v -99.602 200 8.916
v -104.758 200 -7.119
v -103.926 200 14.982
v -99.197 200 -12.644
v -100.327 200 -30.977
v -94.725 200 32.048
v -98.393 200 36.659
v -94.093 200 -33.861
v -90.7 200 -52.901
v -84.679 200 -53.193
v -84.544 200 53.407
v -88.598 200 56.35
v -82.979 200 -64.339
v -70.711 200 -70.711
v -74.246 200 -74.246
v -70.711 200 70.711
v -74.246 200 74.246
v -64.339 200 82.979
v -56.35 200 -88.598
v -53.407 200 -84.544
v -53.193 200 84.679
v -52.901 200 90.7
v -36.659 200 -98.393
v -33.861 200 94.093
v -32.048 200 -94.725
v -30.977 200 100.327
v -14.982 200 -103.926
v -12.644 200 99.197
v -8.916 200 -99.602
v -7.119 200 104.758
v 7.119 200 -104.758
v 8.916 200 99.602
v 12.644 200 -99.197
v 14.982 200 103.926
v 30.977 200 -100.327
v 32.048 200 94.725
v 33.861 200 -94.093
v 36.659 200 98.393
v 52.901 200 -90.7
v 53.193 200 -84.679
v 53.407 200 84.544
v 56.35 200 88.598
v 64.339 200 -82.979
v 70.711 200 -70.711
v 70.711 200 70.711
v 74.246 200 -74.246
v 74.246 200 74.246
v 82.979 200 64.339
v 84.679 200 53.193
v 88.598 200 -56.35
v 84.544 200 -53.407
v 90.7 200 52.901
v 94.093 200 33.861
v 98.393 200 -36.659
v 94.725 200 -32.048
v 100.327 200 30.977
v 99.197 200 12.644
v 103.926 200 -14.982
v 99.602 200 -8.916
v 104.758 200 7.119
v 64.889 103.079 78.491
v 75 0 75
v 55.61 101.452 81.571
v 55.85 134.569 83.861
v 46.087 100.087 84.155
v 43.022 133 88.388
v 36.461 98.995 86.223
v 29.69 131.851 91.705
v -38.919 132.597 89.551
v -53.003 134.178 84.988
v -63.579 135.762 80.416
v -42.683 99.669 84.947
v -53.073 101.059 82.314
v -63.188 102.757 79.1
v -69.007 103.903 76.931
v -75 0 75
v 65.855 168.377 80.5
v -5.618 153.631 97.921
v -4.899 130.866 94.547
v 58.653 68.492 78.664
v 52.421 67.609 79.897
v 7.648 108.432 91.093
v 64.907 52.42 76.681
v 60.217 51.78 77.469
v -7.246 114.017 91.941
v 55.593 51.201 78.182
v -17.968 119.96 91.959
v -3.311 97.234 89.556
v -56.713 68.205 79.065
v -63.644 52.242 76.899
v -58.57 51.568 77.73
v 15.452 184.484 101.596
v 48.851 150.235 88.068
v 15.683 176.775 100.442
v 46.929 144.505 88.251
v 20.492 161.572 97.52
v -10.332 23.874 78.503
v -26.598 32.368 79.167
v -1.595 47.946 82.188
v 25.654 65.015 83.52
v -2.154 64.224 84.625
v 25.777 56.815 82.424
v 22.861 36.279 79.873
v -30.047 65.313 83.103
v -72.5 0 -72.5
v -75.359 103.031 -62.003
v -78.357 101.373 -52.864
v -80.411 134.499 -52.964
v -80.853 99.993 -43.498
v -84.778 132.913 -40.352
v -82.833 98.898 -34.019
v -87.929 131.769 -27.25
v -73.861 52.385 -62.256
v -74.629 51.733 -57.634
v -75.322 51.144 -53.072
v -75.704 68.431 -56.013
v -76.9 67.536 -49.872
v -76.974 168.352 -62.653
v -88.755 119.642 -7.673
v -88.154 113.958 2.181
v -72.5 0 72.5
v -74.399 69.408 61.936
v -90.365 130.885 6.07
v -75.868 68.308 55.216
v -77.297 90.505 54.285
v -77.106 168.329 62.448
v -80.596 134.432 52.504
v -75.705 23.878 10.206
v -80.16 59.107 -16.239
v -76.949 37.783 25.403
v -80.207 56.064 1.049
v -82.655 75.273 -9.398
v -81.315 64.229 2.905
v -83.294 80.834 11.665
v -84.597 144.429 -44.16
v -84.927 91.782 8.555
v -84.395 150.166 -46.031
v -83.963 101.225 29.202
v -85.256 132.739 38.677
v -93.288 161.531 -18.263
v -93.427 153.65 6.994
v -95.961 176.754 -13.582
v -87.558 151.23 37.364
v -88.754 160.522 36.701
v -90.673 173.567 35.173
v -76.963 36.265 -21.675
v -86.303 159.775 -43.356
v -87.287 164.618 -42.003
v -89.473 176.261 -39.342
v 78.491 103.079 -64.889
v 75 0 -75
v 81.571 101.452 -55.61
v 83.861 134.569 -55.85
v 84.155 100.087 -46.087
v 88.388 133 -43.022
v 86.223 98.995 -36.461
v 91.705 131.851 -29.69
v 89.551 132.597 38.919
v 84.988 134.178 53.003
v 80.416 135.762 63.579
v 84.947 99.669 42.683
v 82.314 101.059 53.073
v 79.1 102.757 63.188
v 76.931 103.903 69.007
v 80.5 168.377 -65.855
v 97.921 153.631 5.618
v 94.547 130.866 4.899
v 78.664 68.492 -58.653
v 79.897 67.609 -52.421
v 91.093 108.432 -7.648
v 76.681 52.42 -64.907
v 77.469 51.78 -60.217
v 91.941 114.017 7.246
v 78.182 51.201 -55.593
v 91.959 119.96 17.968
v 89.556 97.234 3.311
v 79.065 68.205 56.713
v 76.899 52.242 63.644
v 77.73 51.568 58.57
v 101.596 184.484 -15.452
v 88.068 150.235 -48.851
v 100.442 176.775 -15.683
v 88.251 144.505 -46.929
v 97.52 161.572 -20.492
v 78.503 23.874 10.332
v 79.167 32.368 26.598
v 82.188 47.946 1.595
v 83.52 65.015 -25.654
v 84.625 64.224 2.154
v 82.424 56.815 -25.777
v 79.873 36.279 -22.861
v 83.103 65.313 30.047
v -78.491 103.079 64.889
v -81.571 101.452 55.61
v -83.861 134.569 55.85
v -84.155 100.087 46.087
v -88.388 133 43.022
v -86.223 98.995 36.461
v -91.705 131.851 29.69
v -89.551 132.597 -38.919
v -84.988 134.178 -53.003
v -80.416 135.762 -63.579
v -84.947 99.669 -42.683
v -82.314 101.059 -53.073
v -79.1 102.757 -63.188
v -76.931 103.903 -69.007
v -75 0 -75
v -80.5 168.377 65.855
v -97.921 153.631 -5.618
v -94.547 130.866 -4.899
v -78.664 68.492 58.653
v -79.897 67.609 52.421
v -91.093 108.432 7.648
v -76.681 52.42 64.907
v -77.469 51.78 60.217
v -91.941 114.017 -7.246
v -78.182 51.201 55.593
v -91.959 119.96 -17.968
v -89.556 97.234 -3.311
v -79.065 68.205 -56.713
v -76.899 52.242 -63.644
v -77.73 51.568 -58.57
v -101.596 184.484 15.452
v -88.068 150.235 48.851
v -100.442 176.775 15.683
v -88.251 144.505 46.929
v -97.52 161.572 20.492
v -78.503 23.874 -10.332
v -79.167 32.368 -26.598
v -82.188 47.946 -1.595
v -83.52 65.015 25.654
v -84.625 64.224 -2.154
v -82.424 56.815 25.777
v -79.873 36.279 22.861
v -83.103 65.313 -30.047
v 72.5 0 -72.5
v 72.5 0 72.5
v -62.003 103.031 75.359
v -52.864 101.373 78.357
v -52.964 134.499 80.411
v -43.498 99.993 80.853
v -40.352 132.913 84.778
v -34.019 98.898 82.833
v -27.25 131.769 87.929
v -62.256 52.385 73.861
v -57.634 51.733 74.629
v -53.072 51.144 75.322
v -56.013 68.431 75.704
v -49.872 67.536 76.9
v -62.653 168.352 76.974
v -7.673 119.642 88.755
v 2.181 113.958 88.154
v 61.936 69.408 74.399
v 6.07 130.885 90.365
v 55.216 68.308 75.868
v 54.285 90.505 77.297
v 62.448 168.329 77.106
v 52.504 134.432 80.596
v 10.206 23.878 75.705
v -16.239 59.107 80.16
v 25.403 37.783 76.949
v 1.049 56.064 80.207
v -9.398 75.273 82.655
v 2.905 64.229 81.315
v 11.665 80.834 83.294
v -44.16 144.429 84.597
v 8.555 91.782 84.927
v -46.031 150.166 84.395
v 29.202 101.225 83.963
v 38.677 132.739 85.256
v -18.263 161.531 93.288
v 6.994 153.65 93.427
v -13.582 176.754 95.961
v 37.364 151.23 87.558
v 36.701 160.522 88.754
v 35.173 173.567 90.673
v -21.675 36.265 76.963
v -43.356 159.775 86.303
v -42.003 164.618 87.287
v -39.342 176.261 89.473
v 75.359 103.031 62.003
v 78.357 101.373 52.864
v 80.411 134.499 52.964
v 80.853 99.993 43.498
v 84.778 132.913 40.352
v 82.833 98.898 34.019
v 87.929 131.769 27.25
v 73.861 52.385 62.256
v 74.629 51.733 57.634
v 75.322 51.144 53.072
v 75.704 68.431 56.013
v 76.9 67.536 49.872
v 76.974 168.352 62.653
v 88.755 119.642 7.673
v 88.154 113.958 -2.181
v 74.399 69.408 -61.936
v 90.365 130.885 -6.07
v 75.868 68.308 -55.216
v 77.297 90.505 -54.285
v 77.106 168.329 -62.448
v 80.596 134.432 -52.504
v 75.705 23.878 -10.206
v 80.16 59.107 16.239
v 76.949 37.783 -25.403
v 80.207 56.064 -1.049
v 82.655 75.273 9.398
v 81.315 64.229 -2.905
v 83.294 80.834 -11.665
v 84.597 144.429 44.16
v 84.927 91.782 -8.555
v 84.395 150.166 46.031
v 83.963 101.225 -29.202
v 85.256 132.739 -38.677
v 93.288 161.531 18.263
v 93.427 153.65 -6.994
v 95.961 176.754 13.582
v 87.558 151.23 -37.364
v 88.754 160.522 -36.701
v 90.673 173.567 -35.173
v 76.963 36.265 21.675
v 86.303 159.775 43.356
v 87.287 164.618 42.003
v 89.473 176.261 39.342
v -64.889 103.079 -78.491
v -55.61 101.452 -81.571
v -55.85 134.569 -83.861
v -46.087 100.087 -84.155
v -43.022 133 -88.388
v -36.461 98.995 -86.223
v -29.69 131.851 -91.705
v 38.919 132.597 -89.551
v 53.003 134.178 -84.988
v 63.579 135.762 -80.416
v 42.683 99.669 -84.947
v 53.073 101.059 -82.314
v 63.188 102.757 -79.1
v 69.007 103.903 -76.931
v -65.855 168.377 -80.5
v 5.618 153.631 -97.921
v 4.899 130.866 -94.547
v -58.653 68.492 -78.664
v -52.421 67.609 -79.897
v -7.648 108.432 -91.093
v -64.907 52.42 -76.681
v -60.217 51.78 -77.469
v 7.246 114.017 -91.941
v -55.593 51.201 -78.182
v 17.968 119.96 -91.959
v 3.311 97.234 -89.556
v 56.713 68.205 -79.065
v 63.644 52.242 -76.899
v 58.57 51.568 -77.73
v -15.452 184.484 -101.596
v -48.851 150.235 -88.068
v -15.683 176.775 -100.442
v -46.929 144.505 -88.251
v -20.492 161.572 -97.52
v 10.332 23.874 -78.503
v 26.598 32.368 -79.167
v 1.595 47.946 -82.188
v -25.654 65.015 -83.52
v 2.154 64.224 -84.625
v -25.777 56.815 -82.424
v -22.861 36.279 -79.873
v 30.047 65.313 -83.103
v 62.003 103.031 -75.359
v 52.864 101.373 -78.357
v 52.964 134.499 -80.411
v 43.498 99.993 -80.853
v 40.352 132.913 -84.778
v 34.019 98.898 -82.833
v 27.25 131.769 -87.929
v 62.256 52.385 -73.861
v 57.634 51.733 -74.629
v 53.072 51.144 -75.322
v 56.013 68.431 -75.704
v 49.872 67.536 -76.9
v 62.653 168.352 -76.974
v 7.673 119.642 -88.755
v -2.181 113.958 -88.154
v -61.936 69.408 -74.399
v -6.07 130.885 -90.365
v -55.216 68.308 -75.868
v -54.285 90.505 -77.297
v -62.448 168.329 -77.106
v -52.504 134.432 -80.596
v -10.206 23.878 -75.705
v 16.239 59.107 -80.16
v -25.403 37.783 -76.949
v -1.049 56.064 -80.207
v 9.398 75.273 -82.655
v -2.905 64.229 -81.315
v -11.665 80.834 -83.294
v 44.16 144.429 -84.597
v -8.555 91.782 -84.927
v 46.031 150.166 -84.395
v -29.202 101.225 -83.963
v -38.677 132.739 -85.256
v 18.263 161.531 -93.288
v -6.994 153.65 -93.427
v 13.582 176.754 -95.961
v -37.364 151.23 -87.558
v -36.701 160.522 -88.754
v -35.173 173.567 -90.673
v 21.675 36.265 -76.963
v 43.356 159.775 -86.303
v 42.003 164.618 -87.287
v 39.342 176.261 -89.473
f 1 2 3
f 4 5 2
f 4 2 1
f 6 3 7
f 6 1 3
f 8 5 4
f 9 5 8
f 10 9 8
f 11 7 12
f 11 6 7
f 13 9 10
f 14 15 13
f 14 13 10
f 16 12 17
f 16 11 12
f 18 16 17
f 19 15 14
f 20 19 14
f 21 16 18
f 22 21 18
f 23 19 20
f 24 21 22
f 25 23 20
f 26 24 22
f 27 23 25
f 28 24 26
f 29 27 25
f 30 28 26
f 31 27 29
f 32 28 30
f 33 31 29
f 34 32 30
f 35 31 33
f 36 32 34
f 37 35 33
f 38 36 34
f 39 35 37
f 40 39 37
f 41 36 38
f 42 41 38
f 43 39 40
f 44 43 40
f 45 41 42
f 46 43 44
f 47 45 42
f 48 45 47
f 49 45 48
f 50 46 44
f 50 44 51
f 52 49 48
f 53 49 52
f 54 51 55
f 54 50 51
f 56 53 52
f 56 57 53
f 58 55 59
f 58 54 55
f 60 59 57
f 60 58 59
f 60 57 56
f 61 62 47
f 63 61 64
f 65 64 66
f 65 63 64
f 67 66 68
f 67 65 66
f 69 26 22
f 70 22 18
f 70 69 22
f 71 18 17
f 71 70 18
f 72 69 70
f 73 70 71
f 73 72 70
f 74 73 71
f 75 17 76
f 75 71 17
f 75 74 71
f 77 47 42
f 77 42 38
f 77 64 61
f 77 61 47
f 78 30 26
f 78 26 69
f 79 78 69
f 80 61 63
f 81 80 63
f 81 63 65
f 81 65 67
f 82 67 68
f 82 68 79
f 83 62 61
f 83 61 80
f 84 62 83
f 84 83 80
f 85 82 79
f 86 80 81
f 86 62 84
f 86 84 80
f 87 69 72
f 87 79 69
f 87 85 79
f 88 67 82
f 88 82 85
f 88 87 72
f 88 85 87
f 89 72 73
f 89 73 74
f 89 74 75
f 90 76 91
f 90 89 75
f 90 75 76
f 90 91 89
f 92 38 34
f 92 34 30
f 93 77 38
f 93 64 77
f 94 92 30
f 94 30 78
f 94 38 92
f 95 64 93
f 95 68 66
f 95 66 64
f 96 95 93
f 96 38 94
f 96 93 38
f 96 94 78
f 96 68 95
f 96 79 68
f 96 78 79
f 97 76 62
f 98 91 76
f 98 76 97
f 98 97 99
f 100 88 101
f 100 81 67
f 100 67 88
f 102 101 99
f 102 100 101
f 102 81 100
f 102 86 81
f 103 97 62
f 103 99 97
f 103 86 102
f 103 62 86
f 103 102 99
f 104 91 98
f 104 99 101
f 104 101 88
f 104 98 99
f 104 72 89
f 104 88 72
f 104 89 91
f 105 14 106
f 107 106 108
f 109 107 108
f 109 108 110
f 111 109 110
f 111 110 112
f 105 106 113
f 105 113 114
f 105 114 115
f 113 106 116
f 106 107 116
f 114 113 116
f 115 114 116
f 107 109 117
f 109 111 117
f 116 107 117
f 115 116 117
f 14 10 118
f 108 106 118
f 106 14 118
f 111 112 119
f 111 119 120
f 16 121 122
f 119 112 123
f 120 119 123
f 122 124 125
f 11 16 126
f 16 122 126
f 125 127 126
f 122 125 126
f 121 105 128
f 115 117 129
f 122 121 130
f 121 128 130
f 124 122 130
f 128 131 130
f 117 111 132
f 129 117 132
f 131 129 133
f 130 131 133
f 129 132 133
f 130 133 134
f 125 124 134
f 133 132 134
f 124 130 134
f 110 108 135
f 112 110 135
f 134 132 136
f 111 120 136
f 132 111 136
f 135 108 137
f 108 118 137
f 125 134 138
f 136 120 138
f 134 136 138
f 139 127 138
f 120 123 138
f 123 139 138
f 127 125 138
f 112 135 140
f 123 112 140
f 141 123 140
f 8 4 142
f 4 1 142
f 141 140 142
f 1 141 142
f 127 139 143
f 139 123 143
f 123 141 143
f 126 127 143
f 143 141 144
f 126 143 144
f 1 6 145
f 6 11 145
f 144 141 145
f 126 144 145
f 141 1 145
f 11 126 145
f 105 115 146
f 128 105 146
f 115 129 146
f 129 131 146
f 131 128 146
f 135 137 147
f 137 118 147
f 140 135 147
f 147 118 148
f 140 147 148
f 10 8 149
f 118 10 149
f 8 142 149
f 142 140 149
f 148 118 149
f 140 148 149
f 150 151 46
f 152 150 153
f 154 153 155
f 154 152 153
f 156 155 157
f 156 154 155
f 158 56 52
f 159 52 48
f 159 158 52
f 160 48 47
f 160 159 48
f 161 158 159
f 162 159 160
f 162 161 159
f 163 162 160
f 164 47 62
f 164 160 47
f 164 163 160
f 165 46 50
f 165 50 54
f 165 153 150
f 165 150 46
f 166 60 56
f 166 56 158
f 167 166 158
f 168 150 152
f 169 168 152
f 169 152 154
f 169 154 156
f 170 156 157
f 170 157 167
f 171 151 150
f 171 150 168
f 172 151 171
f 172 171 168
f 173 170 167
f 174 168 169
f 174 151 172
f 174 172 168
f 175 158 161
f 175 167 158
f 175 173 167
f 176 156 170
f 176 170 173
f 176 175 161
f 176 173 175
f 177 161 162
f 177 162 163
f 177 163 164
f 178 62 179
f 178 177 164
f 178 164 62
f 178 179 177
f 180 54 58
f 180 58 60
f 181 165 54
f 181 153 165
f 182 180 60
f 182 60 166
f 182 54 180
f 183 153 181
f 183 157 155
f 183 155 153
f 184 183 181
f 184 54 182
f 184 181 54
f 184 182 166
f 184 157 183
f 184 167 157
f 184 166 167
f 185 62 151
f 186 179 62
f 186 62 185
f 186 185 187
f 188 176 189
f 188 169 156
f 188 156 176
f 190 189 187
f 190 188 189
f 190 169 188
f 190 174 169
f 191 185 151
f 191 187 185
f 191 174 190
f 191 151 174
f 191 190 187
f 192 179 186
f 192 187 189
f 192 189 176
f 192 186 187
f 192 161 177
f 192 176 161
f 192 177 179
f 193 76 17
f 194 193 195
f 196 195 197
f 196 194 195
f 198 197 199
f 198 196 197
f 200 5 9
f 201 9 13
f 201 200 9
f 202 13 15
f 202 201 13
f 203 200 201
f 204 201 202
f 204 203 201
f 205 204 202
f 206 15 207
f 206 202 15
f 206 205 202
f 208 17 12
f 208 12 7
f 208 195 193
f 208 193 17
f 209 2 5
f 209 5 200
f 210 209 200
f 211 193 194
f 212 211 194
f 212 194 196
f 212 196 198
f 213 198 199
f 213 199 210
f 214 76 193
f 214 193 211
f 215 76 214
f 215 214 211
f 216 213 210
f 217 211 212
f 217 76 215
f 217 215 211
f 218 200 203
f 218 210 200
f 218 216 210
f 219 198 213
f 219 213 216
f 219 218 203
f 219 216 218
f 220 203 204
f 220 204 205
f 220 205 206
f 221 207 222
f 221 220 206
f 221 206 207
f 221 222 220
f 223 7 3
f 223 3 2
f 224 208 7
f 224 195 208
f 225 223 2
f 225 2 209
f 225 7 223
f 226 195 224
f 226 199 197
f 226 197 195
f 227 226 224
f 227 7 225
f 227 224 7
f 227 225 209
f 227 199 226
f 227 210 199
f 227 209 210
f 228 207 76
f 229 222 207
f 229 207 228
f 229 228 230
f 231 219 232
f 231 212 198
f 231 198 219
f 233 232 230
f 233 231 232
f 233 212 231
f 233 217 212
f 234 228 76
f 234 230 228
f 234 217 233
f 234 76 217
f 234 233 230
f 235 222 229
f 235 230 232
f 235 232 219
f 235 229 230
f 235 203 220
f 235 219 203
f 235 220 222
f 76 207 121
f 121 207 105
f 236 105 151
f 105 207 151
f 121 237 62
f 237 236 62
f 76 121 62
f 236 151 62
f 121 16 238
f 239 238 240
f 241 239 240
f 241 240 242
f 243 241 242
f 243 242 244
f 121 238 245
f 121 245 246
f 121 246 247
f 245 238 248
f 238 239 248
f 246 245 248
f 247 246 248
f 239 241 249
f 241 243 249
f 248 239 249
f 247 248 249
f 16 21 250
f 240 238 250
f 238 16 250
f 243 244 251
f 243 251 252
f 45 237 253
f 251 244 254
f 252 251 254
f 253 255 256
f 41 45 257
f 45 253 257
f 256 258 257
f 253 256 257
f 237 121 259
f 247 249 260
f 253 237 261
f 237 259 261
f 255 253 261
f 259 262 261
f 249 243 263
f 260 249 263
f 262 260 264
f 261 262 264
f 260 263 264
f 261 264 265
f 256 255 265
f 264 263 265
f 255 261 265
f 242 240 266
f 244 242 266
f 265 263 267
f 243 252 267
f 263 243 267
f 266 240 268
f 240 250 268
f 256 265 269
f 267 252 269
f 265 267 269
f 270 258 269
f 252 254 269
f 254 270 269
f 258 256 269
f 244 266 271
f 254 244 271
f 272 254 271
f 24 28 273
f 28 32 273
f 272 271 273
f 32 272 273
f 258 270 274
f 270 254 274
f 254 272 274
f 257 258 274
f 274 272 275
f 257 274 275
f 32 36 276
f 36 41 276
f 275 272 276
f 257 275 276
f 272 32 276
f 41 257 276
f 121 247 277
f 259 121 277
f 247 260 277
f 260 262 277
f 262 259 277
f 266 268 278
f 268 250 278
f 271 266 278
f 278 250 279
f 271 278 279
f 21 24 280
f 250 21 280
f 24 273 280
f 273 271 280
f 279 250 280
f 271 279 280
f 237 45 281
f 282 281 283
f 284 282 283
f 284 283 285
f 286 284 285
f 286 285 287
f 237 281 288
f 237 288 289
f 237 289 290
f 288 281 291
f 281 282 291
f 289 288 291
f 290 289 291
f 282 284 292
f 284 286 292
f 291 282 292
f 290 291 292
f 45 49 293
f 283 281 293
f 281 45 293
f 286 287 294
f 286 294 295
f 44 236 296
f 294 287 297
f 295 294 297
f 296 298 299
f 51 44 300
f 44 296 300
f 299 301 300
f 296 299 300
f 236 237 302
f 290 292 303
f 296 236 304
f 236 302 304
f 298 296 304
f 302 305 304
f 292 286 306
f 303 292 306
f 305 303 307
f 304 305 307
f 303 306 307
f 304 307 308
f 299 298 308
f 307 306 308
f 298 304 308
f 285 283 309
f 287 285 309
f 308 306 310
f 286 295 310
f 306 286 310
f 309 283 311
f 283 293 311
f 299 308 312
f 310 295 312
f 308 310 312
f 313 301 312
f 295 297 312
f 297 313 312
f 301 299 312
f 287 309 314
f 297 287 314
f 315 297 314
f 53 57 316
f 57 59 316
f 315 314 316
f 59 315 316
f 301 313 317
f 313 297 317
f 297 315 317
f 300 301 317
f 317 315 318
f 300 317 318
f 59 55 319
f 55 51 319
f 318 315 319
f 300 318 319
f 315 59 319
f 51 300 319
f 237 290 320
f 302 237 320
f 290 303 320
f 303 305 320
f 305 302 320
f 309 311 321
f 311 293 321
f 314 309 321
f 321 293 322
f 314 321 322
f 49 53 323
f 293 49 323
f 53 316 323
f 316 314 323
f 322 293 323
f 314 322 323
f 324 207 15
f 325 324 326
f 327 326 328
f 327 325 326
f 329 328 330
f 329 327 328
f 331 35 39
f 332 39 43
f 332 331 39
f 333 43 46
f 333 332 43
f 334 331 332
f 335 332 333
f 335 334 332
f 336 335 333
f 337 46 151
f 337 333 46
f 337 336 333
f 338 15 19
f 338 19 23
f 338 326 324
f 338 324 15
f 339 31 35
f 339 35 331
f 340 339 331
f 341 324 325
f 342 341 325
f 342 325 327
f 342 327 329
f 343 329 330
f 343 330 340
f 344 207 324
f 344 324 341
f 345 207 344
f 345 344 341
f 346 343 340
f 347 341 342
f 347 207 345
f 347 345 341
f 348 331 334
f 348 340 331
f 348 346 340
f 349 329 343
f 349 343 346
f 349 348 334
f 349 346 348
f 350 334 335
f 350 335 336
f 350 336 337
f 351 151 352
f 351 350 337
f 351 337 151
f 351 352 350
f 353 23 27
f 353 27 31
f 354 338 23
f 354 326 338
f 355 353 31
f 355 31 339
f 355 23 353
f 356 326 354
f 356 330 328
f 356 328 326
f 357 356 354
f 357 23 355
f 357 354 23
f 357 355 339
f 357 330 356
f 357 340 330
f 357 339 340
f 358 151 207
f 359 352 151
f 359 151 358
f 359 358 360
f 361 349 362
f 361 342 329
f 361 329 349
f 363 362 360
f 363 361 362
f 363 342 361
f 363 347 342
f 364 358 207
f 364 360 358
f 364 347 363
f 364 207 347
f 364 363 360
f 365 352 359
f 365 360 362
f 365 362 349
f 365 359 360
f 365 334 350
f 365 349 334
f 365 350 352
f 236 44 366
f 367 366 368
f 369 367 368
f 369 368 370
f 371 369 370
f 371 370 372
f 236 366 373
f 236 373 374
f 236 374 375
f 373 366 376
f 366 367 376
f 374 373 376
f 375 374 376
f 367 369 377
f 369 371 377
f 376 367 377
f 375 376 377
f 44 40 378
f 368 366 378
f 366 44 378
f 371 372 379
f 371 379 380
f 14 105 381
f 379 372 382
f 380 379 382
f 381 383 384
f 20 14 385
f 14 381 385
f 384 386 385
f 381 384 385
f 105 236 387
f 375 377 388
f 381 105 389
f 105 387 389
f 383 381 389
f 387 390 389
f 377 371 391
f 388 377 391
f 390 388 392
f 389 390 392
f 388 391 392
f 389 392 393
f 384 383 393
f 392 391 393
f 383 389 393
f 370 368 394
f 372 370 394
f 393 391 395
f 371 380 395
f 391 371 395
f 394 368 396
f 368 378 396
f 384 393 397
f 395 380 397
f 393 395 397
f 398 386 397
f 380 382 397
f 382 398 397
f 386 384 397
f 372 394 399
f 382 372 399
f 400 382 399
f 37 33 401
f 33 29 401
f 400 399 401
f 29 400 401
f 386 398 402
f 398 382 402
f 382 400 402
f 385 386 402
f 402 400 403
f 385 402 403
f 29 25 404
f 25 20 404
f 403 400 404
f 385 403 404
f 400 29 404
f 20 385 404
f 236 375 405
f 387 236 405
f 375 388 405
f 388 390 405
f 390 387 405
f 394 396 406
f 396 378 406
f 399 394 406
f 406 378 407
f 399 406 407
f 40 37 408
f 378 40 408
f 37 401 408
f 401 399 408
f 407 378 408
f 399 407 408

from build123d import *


with BuildPart() as part:
    # Sketch2 for Loft1 → Loft1 section 0
    with BuildSketch(Plane(origin=(0, 200, 0), x_dir=(1, 0, 0), z_dir=(0, 1, 0))):
        with BuildLine():
            # circular arc as an exact rational Bezier (weights 1, cos(half-angle), 1)
            Bezier((-74.246212025, 74.246212025), (0, 148.492424048), (74.246212025, 74.246212025), weights=[1, 0.707106781, 1])
            Bezier((74.246212025, 74.246212025), (148.492424048, 0), (74.246212025, -74.246212025), weights=[1, 0.707106781, 1])
            Bezier((74.246212025, -74.246212025), (0, -148.492424048), (-74.246212025, -74.246212025), weights=[1, 0.707106781, 1])
            Bezier((-74.246212025, -74.246212025), (-148.492424048, 0), (-74.246212025, 74.246212025), weights=[1, 0.707106781, 1])
        make_face()
    # Sketch1 → Loft1 section 1
    with BuildSketch(Plane(origin=(0, 0, 0), x_dir=(1, 0, 0), z_dir=(0, 1, 0))):
        with BuildLine():
            Line((-75, 75), (75, 75))
            Line((75, 75), (75, -75))
            Line((75, -75), (-75, -75))
            Line((-75, -75), (-75, 75))
        make_face()
    loft()

    # Sketch4 → Cut-Loft1 section 0
    with BuildSketch(Plane.XZ):
        with BuildLine():
            Line((-72.5, 72.5), (72.5, 72.5))
            Line((72.5, 72.5), (72.5, -72.5))
            Line((72.5, -72.5), (-72.5, -72.5))
            Line((-72.5, -72.5), (-72.5, 72.5))
        make_face()
    # Sketch3 for Cut-Loft1 → Cut-Loft1 section 1
    with BuildSketch(Plane(origin=(0, 200, 0), x_dir=(1, 0, 0), z_dir=(0, 1, 0))):
        with BuildLine():
            Bezier((-70.710678119, -70.710678119), (0, -141.421356236), (70.710678119, -70.710678119), weights=[1, 0.707106781, 1])
            Bezier((70.710678119, -70.710678119), (141.421356236, 0), (70.710678119, 70.710678119), weights=[1, 0.707106781, 1])
            Bezier((70.710678119, 70.710678119), (0, 141.421356236), (-70.710678119, 70.710678119), weights=[1, 0.707106781, 1])
            Bezier((-70.710678119, 70.710678119), (-141.421356236, 0), (-70.710678119, -70.710678119), weights=[1, 0.707106781, 1])
        make_face()
    loft(mode=Mode.SUBTRACT)


solid = part.part
